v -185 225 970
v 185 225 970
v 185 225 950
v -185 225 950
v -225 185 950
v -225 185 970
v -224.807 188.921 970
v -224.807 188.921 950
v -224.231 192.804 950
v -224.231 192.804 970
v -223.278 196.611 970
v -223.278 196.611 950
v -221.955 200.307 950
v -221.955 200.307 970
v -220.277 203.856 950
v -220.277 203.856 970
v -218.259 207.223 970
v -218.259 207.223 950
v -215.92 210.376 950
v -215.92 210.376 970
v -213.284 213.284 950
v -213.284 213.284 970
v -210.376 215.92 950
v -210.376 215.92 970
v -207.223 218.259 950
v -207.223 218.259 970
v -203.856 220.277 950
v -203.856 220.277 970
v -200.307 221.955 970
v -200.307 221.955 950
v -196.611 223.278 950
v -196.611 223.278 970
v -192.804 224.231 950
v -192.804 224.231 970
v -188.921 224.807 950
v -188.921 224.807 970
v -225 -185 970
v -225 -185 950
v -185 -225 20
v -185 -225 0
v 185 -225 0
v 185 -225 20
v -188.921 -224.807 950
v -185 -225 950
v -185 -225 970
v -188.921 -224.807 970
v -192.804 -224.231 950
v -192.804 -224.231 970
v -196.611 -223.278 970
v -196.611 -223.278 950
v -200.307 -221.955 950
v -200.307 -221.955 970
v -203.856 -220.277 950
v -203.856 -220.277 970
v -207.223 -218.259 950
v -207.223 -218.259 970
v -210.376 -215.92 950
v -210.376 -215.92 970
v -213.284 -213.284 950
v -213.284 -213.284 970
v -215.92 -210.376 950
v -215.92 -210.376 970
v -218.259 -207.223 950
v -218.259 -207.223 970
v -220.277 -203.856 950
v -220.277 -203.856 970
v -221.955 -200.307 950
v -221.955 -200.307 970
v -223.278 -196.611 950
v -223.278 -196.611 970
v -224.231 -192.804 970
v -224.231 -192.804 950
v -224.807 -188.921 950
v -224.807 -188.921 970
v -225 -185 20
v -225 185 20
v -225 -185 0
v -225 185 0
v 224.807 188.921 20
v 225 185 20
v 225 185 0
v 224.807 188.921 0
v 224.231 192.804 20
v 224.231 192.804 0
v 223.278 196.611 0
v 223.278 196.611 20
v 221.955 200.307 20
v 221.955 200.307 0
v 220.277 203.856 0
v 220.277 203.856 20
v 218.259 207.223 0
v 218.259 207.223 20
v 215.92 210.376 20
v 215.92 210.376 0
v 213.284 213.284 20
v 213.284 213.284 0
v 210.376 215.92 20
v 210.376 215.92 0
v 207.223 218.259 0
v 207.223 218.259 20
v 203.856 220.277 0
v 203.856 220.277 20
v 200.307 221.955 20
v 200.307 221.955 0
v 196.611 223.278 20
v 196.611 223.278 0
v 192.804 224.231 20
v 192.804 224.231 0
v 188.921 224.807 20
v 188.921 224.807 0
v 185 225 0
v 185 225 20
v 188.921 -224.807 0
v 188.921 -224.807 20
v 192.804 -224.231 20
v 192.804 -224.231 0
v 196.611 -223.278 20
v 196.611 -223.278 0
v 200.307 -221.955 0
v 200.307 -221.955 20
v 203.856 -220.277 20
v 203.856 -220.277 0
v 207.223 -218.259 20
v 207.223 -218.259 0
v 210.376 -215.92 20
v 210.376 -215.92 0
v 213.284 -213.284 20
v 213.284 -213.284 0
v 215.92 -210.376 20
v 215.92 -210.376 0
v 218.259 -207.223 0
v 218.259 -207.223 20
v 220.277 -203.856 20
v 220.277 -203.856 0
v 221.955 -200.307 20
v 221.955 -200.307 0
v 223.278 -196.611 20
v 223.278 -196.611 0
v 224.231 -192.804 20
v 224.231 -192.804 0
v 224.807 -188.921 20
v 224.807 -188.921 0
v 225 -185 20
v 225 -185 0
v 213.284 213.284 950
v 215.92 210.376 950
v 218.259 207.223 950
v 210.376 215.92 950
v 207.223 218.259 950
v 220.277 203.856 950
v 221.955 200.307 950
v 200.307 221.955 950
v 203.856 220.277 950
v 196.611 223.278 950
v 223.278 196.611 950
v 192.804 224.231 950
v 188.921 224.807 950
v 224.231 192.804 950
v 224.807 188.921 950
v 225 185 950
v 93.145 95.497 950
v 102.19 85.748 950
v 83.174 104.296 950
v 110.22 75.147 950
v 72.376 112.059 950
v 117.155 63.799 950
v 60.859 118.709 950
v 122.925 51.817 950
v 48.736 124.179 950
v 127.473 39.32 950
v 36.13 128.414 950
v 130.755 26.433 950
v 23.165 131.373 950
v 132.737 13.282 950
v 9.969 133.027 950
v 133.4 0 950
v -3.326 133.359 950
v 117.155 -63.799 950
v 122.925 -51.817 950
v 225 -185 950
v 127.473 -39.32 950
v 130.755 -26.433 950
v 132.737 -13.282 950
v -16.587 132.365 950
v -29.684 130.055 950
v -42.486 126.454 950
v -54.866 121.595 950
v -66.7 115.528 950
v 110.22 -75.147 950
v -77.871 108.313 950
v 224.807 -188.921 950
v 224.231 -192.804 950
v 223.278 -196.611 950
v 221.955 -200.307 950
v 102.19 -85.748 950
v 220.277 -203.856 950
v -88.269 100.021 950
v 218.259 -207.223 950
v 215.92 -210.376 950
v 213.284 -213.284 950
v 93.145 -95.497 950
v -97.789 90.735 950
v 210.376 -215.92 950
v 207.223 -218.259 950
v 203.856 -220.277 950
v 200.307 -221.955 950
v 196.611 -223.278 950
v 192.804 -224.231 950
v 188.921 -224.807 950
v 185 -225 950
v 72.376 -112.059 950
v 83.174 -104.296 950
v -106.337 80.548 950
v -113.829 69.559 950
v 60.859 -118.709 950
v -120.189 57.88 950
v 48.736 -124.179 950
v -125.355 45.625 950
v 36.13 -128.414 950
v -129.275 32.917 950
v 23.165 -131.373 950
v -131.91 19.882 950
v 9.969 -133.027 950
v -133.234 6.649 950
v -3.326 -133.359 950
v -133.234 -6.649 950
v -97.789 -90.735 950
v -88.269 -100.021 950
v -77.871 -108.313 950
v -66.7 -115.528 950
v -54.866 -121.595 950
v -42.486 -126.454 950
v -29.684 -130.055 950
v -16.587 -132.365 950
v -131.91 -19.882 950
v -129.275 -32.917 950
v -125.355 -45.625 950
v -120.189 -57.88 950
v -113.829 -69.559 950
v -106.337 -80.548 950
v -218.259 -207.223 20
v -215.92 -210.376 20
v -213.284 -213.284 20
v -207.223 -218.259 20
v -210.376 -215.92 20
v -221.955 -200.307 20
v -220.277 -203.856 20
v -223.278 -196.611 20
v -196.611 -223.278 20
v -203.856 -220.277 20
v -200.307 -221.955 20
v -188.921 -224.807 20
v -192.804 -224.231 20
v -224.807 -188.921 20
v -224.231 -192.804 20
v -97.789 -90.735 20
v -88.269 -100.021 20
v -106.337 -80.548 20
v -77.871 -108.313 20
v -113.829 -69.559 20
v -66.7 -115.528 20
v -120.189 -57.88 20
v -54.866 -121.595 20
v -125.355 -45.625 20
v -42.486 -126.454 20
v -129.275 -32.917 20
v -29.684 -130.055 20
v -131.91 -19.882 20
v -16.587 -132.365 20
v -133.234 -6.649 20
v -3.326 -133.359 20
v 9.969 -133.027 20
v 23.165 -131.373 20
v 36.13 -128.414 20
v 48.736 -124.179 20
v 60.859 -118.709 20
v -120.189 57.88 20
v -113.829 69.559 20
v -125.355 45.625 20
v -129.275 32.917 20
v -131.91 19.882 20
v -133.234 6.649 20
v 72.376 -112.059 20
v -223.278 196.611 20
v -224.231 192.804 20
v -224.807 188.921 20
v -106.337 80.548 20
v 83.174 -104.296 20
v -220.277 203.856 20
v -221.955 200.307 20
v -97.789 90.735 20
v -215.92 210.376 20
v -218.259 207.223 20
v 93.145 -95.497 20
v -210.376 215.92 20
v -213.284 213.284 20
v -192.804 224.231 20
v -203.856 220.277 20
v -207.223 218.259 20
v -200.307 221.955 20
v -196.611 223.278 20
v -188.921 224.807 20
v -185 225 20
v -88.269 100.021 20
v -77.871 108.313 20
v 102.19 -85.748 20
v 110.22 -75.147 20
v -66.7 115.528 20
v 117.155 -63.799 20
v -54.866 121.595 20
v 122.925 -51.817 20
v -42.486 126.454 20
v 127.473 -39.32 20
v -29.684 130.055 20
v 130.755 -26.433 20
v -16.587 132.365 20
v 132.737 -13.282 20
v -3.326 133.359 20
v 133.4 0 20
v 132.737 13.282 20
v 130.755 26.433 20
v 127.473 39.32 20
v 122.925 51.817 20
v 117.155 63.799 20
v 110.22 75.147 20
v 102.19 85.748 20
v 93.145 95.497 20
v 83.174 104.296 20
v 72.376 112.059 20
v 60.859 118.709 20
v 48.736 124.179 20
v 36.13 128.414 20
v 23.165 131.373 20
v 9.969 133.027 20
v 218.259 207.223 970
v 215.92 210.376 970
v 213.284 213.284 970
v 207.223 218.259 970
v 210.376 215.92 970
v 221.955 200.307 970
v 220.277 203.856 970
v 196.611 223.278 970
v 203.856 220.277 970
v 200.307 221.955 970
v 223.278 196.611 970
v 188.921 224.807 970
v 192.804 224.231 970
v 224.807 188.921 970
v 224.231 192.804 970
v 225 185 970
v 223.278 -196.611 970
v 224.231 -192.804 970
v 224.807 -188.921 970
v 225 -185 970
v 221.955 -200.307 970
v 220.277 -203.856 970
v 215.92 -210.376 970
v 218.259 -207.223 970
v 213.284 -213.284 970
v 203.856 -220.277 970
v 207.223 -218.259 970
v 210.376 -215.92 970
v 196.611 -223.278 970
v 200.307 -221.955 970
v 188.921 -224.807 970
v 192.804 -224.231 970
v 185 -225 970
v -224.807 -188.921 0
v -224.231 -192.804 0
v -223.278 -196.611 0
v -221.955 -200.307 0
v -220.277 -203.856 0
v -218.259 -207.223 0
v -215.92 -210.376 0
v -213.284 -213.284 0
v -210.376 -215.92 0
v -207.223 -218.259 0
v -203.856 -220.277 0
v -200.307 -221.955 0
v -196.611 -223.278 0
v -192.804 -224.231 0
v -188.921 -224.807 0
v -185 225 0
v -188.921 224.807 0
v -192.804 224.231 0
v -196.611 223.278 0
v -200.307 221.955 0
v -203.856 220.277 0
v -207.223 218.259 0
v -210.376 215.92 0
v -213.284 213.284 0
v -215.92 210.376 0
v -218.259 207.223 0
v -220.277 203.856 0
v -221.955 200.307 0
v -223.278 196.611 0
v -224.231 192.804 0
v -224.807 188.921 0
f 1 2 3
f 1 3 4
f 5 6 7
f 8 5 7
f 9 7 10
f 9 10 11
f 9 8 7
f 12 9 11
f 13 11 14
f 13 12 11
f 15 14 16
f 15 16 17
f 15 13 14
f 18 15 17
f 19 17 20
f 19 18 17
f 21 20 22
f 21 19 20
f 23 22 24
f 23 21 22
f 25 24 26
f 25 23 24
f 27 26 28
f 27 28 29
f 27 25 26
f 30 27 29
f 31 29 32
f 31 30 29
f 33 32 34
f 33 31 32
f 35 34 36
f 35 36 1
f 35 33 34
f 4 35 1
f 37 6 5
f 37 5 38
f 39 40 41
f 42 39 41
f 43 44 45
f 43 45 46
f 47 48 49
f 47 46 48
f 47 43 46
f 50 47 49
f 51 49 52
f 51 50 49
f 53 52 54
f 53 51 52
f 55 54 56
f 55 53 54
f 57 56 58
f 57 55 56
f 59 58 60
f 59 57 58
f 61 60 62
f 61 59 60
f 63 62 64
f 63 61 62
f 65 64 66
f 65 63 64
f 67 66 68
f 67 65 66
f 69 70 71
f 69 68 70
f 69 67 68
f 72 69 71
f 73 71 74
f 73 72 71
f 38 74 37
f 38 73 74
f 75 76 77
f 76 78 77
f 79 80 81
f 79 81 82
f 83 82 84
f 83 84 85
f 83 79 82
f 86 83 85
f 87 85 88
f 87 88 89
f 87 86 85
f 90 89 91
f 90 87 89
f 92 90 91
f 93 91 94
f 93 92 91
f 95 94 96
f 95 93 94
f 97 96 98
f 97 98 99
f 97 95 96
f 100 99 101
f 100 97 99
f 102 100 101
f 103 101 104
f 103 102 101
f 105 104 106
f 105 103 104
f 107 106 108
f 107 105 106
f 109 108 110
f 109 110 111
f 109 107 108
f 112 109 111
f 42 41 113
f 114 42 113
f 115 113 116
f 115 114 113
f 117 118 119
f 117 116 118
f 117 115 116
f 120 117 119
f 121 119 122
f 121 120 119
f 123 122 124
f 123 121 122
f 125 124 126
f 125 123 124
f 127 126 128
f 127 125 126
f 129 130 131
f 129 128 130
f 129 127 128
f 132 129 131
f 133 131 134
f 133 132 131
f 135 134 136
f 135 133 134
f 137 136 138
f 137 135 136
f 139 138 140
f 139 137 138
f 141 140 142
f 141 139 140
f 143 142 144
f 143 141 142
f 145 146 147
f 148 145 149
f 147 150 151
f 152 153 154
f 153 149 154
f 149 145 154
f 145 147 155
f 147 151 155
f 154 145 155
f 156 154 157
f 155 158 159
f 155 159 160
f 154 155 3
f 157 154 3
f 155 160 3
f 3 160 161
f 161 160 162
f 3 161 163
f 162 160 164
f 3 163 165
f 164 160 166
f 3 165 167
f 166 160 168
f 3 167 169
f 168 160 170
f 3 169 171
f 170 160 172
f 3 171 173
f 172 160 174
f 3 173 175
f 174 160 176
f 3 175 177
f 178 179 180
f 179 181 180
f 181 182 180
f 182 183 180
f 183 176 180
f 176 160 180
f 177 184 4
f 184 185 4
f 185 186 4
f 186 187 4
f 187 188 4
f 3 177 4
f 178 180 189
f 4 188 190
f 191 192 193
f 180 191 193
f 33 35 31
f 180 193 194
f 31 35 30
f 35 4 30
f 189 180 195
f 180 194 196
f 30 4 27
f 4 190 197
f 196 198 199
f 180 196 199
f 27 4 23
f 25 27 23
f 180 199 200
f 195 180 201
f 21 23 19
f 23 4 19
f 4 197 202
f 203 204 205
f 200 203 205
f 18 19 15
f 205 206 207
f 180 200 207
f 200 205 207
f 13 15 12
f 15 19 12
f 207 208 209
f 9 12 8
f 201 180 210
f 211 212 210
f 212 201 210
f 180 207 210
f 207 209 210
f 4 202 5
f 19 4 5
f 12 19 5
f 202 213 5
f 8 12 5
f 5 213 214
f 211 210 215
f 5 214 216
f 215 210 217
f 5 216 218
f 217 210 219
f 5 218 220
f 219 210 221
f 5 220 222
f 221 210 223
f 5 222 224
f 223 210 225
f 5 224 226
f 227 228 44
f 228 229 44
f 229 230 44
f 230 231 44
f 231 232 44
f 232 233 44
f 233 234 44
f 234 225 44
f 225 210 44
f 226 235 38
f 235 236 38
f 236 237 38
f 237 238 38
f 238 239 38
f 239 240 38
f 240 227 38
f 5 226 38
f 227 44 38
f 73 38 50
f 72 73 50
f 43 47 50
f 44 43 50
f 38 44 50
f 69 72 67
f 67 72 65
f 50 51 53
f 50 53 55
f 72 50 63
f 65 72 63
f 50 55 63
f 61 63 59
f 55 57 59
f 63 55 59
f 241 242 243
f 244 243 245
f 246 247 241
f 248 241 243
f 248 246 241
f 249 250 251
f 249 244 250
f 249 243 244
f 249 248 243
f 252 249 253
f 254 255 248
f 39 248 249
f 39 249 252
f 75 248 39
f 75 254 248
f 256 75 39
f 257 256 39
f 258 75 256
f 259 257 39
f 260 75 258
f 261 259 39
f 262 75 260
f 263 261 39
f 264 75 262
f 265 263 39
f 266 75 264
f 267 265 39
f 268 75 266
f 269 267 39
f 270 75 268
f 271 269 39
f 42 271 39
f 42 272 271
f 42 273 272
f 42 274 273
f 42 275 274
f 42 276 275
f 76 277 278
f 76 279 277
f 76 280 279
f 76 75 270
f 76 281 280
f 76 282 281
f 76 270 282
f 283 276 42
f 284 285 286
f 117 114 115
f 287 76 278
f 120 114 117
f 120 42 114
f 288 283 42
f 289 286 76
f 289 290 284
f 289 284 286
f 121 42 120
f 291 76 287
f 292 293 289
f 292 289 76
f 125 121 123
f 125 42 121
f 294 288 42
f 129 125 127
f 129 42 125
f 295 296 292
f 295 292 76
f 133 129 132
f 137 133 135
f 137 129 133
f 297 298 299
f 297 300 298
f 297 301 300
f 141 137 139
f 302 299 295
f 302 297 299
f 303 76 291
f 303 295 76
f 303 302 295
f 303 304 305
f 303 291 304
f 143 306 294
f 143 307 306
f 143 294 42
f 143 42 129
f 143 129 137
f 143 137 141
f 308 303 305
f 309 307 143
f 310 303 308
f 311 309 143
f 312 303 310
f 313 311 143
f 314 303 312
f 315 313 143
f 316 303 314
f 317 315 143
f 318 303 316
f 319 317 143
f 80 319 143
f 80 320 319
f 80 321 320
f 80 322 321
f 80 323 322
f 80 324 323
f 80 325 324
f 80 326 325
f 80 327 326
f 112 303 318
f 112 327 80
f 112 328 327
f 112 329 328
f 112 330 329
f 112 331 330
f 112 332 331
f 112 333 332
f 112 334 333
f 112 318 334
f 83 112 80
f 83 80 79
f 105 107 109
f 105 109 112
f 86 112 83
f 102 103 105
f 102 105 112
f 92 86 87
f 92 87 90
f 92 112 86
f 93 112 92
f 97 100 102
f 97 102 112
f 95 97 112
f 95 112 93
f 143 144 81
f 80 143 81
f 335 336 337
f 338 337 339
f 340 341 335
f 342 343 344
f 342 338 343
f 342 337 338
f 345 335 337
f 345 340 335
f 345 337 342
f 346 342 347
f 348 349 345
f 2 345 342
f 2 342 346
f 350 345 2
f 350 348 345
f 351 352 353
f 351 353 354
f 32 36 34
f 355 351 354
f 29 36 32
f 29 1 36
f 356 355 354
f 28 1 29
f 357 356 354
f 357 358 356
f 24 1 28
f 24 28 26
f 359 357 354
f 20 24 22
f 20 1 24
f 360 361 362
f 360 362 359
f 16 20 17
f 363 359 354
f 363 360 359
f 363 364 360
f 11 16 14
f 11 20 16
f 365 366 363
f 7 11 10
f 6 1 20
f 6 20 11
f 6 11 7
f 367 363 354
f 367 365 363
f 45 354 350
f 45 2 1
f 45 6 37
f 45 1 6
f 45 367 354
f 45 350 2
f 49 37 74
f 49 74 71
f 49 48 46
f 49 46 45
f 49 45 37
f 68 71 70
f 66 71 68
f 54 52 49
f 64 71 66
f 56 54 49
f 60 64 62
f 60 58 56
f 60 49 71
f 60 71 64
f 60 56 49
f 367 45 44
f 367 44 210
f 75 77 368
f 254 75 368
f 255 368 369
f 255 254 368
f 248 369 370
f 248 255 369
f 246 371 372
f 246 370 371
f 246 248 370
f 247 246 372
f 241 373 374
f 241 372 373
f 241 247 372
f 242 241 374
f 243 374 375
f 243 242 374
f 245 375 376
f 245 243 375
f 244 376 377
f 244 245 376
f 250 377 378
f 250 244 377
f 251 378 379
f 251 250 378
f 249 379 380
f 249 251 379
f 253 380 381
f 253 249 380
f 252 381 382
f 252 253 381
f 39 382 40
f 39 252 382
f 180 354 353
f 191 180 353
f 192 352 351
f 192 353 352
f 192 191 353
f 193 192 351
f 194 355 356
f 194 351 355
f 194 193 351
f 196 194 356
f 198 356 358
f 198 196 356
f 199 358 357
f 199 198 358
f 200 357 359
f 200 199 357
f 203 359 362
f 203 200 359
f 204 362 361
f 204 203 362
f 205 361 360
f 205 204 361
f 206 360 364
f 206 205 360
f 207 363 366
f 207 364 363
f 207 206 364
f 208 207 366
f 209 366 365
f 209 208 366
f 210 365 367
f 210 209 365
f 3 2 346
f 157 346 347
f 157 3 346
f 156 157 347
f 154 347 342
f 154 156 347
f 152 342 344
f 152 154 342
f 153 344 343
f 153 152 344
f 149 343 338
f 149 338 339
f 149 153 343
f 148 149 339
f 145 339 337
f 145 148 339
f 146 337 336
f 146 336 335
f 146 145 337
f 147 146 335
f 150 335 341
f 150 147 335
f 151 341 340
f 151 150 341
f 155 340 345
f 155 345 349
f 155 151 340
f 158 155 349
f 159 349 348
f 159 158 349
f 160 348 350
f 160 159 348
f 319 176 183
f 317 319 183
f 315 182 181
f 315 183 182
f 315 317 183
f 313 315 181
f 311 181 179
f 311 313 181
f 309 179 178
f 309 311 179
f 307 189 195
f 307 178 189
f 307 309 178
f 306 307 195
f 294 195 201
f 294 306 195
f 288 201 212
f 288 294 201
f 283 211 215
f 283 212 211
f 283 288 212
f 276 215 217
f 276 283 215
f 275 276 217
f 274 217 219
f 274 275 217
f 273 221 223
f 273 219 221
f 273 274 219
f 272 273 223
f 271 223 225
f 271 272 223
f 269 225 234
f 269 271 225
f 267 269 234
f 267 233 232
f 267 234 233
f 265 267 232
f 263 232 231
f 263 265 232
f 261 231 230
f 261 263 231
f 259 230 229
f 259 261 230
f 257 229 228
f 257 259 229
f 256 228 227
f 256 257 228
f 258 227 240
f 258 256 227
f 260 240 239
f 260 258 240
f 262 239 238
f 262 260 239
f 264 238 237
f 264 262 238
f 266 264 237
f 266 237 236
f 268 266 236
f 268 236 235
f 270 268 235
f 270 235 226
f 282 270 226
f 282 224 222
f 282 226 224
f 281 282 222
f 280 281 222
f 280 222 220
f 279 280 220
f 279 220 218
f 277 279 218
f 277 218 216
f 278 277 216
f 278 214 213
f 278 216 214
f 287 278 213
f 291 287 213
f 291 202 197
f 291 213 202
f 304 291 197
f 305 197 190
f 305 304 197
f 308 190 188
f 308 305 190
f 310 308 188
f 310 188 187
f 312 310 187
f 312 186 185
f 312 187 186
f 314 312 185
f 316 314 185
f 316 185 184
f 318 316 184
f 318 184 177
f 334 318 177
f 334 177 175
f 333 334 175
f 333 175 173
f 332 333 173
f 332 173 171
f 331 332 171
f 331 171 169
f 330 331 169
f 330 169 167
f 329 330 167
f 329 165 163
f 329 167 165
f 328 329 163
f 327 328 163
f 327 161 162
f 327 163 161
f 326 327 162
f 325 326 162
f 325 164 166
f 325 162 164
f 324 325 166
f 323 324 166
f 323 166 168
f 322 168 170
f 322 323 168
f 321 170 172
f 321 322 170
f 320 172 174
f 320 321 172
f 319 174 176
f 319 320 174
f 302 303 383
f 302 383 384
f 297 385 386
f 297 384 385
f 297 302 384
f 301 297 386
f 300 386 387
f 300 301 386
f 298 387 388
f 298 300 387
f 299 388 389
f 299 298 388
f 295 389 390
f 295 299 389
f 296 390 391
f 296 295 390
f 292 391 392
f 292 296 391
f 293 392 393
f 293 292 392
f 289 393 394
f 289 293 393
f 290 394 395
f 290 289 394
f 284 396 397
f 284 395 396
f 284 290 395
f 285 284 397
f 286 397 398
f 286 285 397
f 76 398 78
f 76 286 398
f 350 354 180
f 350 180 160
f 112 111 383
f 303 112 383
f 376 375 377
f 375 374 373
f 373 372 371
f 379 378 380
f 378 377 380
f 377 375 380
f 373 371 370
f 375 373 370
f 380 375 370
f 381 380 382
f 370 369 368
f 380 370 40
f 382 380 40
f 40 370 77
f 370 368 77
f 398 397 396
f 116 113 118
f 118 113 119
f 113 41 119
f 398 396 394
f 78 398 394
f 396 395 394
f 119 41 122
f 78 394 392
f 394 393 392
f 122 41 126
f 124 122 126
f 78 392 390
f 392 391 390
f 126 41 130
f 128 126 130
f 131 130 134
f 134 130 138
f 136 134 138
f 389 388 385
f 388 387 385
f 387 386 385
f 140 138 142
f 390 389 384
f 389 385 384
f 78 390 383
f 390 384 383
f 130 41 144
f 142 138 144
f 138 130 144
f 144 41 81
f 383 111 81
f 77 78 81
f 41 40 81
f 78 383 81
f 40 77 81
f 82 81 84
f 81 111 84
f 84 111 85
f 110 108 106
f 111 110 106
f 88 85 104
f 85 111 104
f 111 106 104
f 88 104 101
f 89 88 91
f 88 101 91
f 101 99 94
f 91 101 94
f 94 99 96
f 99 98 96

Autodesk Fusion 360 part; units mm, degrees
sketch "Sketch1" plane through (0, 0, 0) normal (0, 0, 1) x (1, 0, 0)
  line L0 (225, 225) -> (-225, 225)
  line L1 (-225, 225) -> (-225, -225)
  line L2 (-225, -225) -> (225, -225)
  line L3 (225, -225) -> (225, 225)
  line L4 (225, 225) -> (-225, -225) construction
  line L5 (-225, 225) -> (225, -225) construction
  circle A0 centre (0, 0) radius 133.4
  dimension "d1" = 450
  dimension "d2" = 450
  dimension "d3" = 266.8
extrude "Extrude1" add sketch "Sketch1" along normal blind 20
extrude "Extrude2" add sketch "Sketch1" along normal blind 970 contours A0
sketch "Sketch2" plane through (0, 0, 970) normal (0, 0, 1) x (-1, 0, 0)
  circle A0 centre (0, 0) radius 133.4
  line L0 (225, 225) -> (-225, 225)
  line L1 (-225, 225) -> (-225, -225)
  line L2 (-225, -225) -> (225, -225)
  line L3 (225, -225) -> (225, 225)
  line L4 (225, 225) -> (-225, -225) construction
  line L5 (-225, 225) -> (225, -225) construction
  dimension "d8" = 450
  dimension "d9" = 450
extrude "Extrude3" add sketch "Sketch2" against normal blind 20
fillet "Fillet1" radius 40 8 edges at (225, 225, 960) (225, -225, 960) (-225, -225, 960) (-225, 225, 960) (-225, 225, 10) (-225, -225, 10) (225, 225, 10) (225, -225, 10)
